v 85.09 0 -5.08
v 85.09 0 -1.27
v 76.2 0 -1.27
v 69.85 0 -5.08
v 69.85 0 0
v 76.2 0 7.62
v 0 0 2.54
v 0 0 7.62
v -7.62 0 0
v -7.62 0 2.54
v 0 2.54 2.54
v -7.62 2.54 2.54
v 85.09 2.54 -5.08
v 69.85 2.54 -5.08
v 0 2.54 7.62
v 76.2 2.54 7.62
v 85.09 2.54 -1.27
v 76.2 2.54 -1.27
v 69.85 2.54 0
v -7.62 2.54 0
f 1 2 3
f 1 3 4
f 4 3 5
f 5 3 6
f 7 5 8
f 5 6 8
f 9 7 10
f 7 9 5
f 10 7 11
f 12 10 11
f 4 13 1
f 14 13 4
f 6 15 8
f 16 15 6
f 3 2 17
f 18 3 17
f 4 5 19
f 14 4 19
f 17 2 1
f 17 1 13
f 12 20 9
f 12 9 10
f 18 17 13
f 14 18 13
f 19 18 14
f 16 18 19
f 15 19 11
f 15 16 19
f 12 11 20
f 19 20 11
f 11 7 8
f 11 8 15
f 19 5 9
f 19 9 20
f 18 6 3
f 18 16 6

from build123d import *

# Parameters (mm, degrees)
SKETCH1_W           = 76.2
SKETCH1_H           = 2.54
BOSS_EXTRUDE1_DEPTH = 7.62
SKETCH3_W           = 2.54
SKETCH3_H           = 2.54
BOSS_EXTRUDE2_DEPTH = 7.62
SKETCH4_W           = 15.24
SKETCH4_H           = 2.54
BOSS_EXTRUDE3_DEPTH = 5.08
SKETCH5_W           = 1.27
SKETCH5_H           = 2.54
CUT_EXTRUDE2_DEPTH  = 8.89


with BuildPart() as part:
    # Sketch1 → Boss-Extrude1 (new body)
    with BuildSketch(Plane.XY):
        with Locations((38.1, 1.27)):
            Rectangle(SKETCH1_W, SKETCH1_H)
    extrude(amount=BOSS_EXTRUDE1_DEPTH)

    # Sketch3 → Boss-Extrude2 (add)
    with BuildSketch(Plane.ZY):
        with Locations((1.27, 1.27)):
            Rectangle(SKETCH3_W, SKETCH3_H)
    extrude(amount=BOSS_EXTRUDE2_DEPTH)

    # Sketch4 → Boss-Extrude3 (add)
    with BuildSketch(Plane(origin=(0, 0, 0), x_dir=(-1, 0, 0), z_dir=(0, 0, -1))):
        with Locations((-77.47, 1.27)):
            Rectangle(SKETCH4_W, SKETCH4_H)
    extrude(amount=BOSS_EXTRUDE3_DEPTH)

    # Sketch5 → Cut-Extrude2 (cut)
    with BuildSketch(Plane(origin=(85.09, 0, 0), x_dir=(0, 0, -1), z_dir=(1, 0, 0))):
        with Locations((0.635, 1.27)):
            Rectangle(SKETCH5_W, SKETCH5_H)
    extrude(amount=-CUT_EXTRUDE2_DEPTH, mode=Mode.SUBTRACT)


solid = part.part
